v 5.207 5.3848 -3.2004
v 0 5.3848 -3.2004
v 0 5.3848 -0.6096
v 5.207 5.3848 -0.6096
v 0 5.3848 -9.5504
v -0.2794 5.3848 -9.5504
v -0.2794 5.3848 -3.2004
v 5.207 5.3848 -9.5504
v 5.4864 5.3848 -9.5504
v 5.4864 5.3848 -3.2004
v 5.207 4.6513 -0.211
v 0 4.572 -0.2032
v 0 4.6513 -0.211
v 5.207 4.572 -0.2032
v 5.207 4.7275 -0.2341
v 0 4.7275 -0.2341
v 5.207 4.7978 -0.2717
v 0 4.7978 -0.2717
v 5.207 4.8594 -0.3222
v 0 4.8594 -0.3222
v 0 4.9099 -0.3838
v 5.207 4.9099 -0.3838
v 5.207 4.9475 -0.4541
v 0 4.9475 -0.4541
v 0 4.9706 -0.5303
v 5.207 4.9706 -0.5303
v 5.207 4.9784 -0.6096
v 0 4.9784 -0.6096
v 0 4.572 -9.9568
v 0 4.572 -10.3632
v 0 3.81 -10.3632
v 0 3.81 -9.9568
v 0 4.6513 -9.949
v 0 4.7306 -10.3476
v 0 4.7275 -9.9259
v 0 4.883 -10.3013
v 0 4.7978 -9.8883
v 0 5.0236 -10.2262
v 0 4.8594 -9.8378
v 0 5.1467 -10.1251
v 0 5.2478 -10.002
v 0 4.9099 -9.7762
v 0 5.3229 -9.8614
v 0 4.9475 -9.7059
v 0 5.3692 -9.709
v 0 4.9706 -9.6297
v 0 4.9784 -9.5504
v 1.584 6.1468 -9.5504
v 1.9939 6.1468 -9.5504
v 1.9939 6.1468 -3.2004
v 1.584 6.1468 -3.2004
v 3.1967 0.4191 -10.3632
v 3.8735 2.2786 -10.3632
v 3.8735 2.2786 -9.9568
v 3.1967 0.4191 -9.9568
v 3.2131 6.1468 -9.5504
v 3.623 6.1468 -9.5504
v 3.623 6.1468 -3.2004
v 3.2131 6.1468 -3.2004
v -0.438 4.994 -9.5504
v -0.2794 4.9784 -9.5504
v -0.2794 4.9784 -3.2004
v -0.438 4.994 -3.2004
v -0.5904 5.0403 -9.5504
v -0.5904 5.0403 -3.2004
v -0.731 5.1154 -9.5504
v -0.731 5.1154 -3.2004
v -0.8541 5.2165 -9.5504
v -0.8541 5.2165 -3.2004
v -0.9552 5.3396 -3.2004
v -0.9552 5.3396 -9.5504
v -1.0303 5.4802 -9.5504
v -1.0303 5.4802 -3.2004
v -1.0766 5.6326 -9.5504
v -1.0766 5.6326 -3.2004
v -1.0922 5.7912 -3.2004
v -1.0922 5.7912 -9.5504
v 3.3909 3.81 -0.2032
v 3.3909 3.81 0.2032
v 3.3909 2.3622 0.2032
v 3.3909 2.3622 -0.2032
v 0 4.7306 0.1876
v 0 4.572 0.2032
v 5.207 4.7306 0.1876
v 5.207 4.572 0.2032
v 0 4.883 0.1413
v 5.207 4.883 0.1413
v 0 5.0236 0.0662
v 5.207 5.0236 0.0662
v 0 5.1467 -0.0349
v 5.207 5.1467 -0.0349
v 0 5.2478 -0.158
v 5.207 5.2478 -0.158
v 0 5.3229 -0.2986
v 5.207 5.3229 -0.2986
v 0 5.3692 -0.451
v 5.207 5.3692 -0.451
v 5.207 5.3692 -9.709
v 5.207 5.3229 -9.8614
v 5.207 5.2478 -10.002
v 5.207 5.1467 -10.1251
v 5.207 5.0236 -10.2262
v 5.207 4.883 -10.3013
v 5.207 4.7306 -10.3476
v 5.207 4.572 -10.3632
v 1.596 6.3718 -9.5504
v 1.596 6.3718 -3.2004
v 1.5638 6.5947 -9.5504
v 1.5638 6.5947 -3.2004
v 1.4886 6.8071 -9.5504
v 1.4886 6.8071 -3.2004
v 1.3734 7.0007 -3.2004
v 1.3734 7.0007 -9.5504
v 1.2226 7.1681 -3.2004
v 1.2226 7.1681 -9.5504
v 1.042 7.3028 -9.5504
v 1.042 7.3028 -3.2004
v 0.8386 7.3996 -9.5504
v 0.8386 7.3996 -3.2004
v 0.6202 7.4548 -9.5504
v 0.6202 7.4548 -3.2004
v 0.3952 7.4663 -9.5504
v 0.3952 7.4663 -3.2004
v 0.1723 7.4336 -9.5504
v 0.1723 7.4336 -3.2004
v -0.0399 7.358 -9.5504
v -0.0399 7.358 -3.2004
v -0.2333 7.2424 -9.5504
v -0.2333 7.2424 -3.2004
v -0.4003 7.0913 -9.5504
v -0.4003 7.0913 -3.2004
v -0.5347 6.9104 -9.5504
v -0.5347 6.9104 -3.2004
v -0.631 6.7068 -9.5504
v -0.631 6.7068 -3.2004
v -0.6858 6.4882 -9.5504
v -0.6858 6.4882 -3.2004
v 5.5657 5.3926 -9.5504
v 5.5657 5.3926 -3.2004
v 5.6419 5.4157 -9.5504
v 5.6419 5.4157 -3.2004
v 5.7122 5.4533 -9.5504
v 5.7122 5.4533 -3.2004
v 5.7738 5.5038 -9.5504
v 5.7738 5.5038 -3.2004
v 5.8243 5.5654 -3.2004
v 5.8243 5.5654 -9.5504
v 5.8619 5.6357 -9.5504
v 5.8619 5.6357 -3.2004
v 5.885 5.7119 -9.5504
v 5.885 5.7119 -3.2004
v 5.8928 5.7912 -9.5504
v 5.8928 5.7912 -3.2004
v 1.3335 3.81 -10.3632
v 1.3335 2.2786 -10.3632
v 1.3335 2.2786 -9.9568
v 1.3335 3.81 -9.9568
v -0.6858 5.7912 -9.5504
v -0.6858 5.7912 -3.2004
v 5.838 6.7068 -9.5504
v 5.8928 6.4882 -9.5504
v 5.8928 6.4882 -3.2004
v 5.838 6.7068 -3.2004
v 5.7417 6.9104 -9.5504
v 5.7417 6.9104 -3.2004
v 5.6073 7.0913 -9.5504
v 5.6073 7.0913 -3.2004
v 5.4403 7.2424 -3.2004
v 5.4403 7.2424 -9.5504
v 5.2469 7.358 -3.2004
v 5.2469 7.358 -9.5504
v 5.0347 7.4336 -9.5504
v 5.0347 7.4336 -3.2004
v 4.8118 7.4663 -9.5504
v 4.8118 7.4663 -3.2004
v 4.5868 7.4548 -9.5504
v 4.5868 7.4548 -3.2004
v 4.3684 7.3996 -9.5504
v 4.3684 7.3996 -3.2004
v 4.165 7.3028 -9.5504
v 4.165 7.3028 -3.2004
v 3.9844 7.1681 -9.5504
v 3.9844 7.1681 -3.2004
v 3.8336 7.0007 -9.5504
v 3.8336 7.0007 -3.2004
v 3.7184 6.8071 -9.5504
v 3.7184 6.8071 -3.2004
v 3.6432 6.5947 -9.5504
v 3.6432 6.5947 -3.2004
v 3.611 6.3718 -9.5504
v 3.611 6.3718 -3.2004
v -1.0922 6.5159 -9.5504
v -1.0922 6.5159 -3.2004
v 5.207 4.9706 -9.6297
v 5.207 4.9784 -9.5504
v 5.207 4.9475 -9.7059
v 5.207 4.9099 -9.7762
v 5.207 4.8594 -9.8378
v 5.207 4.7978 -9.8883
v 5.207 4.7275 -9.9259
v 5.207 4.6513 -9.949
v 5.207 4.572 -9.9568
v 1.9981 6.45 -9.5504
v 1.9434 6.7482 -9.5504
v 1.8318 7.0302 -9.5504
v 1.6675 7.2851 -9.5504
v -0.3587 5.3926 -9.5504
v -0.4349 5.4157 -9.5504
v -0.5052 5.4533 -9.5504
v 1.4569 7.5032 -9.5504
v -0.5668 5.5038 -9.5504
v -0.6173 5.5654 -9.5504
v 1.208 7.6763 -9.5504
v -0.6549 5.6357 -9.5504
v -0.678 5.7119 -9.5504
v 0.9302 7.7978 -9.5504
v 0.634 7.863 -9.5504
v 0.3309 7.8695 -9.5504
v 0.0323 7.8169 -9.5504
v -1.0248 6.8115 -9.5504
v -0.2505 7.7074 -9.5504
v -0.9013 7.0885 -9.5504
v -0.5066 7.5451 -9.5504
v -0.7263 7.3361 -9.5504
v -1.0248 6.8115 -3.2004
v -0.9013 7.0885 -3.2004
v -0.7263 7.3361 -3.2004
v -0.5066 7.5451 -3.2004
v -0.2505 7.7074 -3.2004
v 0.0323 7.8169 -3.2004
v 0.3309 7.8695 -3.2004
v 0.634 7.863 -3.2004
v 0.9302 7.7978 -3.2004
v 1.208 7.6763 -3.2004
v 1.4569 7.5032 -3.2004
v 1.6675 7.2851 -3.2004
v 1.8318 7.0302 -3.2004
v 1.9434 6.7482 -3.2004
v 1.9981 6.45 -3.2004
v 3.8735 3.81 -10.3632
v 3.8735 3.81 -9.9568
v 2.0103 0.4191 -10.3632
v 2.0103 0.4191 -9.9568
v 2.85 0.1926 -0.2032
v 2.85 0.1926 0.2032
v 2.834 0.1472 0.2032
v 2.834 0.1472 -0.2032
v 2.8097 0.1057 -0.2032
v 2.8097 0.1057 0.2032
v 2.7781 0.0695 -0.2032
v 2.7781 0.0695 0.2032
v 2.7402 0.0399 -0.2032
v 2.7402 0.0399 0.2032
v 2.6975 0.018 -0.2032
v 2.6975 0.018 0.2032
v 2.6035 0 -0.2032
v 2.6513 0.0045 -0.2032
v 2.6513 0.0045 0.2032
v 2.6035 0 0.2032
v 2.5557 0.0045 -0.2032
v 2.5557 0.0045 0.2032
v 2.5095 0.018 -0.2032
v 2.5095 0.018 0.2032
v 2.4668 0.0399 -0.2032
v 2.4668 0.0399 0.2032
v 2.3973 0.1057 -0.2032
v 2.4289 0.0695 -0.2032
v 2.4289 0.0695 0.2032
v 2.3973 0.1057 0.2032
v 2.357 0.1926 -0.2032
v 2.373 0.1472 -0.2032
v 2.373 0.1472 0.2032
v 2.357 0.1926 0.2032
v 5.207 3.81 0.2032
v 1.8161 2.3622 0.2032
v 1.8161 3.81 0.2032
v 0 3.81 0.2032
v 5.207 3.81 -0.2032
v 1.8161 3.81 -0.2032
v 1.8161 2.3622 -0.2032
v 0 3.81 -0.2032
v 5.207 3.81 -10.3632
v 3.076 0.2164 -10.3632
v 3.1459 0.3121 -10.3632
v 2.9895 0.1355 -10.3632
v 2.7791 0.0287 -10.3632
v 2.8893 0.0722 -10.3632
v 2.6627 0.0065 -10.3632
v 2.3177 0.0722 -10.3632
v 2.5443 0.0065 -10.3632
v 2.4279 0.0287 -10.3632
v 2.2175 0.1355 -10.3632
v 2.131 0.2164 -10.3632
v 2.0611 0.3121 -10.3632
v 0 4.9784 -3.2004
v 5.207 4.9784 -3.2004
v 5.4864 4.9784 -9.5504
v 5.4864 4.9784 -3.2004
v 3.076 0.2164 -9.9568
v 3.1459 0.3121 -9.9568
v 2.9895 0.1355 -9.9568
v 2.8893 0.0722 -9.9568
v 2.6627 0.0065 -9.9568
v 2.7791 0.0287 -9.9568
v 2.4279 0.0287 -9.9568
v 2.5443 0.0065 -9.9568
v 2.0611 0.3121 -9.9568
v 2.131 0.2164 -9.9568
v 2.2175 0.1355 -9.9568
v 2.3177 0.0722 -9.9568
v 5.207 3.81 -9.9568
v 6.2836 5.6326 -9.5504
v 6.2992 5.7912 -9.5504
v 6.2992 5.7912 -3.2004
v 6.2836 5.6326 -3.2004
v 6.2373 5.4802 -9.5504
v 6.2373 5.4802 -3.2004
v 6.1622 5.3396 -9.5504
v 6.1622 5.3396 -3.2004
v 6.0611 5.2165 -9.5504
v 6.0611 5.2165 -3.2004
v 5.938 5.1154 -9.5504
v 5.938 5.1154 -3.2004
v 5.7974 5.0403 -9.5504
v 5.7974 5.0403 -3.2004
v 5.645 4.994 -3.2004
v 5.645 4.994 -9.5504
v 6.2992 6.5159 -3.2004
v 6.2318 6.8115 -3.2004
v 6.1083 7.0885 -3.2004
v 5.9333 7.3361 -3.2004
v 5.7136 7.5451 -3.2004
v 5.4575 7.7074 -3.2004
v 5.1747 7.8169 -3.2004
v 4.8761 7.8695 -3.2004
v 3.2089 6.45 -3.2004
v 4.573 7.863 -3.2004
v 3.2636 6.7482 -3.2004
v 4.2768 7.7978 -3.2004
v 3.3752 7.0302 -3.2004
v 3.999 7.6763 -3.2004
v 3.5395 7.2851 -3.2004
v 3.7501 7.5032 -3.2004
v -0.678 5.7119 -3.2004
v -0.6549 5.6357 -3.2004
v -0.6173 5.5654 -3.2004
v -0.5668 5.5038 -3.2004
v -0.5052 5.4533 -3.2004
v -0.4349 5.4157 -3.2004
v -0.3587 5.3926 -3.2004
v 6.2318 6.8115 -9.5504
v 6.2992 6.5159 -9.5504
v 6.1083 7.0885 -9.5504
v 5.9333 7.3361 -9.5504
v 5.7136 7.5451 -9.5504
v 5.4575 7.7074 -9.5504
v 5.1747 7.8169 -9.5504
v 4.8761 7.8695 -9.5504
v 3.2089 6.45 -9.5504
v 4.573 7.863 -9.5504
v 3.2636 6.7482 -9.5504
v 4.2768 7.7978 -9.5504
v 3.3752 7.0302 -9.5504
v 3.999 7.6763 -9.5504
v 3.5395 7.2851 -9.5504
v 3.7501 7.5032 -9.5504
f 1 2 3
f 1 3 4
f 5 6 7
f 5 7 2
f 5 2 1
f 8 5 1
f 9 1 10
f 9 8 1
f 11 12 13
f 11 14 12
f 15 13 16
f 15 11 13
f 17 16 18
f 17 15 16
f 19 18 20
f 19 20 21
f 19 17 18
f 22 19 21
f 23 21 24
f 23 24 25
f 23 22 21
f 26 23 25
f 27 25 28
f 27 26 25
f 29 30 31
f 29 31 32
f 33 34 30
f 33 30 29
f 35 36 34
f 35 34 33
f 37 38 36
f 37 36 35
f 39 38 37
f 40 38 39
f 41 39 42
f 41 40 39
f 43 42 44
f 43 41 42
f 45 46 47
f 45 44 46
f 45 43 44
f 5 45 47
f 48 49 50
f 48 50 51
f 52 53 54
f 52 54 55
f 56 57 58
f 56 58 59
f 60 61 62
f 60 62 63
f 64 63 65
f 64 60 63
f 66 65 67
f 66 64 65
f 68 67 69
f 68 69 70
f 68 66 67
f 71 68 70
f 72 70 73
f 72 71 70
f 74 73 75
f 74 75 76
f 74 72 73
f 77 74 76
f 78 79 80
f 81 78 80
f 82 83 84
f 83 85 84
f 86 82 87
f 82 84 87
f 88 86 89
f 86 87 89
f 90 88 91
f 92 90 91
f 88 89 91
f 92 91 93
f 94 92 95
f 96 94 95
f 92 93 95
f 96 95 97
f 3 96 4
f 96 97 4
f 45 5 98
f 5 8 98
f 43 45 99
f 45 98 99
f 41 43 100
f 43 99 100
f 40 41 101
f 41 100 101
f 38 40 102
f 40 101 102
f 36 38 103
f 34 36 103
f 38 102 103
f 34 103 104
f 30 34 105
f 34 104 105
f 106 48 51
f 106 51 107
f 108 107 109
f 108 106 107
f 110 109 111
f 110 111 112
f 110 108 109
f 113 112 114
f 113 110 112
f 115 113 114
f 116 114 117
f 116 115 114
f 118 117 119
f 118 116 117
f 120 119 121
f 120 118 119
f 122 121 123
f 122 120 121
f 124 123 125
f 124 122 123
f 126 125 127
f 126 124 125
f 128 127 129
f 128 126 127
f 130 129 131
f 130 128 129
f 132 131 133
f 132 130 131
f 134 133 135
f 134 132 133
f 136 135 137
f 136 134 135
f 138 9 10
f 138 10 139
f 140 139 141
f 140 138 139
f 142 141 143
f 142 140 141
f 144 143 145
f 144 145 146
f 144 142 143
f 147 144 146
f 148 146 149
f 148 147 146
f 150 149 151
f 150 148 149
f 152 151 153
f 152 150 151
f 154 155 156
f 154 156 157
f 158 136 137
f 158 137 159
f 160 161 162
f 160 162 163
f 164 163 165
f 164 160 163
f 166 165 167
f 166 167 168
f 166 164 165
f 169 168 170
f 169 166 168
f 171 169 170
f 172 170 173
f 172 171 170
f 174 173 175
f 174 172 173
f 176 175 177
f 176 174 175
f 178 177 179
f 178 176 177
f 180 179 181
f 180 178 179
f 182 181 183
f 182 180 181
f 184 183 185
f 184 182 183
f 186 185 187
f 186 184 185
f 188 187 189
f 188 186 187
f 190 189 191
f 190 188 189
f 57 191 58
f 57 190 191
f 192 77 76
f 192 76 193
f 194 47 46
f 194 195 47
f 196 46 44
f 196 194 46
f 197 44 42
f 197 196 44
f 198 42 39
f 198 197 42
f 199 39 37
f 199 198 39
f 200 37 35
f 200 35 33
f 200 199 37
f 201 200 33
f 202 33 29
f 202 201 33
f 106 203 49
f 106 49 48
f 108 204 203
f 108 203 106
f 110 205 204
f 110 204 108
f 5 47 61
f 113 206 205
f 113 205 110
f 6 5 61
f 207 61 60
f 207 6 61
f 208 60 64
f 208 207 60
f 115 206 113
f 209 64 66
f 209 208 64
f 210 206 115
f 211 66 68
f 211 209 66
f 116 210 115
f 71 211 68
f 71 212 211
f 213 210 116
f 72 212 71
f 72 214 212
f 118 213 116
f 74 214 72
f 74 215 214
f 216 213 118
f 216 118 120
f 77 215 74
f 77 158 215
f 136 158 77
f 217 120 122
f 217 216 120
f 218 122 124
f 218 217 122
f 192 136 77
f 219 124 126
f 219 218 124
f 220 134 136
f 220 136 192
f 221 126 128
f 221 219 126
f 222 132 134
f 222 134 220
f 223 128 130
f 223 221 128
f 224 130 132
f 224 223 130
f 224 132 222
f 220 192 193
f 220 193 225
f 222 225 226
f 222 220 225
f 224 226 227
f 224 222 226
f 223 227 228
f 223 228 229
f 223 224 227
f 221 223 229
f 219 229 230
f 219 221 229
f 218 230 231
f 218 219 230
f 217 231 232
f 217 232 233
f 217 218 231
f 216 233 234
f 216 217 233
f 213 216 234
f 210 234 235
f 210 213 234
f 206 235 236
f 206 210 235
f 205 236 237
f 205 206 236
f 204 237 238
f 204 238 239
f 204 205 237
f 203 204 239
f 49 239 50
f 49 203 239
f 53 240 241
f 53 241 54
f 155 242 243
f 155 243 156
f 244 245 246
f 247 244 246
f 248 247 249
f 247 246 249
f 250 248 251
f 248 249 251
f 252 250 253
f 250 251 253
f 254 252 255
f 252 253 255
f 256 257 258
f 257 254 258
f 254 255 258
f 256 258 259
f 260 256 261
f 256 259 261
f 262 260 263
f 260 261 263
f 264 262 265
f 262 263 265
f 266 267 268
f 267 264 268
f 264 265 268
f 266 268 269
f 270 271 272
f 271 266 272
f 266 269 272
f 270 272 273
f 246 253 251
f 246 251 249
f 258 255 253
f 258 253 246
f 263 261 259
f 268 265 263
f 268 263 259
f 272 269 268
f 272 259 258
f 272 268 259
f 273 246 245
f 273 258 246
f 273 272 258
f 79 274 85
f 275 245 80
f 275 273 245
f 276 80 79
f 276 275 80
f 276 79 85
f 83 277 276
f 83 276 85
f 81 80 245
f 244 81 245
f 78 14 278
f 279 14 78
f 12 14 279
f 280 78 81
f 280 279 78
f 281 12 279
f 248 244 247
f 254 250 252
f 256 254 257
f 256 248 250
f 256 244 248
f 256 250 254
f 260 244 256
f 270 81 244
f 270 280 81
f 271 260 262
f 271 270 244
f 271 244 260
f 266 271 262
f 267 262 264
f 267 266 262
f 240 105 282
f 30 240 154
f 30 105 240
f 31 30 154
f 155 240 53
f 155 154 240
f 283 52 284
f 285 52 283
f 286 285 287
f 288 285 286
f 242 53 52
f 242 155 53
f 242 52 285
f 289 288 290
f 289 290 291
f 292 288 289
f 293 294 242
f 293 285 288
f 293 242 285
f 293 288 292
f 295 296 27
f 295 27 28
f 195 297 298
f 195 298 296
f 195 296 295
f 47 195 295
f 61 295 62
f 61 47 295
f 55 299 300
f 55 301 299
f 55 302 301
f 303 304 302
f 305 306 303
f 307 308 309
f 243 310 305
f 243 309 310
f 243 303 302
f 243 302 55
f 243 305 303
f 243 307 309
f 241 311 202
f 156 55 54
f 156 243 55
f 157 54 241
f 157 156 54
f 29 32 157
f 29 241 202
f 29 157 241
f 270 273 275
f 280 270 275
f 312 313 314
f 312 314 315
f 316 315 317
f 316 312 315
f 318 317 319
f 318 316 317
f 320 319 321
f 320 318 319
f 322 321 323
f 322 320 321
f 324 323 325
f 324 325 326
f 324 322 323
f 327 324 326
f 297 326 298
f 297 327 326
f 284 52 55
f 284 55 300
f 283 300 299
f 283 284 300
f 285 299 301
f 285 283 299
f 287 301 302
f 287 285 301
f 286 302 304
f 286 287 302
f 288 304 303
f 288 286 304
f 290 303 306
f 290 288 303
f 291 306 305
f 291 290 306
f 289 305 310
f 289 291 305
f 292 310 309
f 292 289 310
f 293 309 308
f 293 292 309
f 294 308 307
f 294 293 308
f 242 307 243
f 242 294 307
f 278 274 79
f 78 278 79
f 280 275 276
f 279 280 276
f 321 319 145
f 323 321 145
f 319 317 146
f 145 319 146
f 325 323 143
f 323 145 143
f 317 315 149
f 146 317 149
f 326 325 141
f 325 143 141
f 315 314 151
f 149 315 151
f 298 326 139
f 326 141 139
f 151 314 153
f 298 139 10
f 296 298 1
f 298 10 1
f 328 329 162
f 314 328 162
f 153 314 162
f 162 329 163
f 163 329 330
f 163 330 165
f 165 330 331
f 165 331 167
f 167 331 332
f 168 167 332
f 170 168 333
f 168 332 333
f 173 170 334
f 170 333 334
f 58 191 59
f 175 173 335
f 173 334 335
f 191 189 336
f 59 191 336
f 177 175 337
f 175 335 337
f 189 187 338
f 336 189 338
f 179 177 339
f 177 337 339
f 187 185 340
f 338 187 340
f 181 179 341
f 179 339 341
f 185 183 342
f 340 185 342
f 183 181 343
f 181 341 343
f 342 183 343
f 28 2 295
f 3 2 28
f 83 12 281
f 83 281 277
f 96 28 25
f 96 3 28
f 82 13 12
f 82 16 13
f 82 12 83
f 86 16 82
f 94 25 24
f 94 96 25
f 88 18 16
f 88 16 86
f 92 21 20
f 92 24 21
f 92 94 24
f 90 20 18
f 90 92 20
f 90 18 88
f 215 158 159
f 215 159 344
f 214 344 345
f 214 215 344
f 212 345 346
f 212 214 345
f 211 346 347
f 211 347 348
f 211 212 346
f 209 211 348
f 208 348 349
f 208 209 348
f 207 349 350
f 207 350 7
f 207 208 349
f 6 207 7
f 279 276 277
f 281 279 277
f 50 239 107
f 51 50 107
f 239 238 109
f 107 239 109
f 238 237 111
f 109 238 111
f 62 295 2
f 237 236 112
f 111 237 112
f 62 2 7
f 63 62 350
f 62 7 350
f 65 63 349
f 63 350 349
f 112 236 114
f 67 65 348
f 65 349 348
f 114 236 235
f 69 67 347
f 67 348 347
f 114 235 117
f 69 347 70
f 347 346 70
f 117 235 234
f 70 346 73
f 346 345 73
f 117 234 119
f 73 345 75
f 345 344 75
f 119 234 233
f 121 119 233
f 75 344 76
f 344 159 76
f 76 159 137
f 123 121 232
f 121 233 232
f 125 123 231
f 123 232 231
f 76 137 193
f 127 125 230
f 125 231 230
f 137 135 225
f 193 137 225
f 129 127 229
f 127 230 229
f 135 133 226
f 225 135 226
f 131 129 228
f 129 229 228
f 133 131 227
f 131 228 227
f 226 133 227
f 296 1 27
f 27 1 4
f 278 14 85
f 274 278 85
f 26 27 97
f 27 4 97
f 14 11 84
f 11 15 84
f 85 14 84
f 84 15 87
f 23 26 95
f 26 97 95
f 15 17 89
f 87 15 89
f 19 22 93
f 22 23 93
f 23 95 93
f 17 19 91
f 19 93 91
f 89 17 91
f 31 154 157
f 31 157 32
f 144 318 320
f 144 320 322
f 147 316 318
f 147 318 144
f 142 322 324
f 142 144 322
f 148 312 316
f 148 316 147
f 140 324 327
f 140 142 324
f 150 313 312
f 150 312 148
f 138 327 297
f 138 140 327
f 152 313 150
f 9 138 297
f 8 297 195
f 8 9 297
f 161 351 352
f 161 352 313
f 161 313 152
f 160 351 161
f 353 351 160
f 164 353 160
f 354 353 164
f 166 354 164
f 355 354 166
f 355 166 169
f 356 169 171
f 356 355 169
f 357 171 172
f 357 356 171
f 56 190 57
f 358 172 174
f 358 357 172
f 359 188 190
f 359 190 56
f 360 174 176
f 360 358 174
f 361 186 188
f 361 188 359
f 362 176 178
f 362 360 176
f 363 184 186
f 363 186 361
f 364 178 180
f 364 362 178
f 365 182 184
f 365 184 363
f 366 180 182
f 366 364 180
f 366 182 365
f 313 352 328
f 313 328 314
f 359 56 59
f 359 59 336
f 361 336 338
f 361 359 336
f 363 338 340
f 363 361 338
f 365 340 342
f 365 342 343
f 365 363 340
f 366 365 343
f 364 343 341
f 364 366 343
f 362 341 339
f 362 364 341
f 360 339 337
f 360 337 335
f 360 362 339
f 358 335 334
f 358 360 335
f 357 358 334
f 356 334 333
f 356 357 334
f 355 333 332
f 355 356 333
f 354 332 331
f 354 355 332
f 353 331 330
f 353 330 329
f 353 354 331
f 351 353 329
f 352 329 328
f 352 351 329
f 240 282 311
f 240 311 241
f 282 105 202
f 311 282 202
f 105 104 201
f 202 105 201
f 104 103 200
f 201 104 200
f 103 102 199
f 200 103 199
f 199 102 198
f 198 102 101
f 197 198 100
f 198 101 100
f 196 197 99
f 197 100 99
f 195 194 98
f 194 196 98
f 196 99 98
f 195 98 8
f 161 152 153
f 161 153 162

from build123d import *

# Parameters (mm, degrees)
BOSS_EXTRUDE1_DEPTH = 5.207
CUT_EXTRUDE1_DEPTH  = 5.207
CUT_EXTRUDE2_DEPTH  = 5.207
FILLET1_R           = 0.4064
FILLET2_R           = 0.8128
BOSS_EXTRUDE2_DEPTH = 6.35


with BuildPart() as part:
    # Sketch1 → Boss-Extrude1 (new body)
    with BuildSketch(Plane(origin=(0, 0, 0), x_dir=(0, 0, -1), z_dir=(1, 0, 0))):
        Polygon((-0.2032, 0), (-0.2032, 5.3848), (10.3632, 5.3848), (10.3632, 0), (9.9568, 0), (9.9568, 4.9784), (0.2032, 4.9784), (0.2032, 0), align=None)
    extrude(amount=BOSS_EXTRUDE1_DEPTH)

    # Sketch2 → Cut-Extrude1 (cut)
    with BuildSketch(Plane(origin=(0, 0, -10.3632), x_dir=(-1, 0, 0), z_dir=(0, 0, -1))):
        with BuildLine():
            Line((-1.3335, 2.278639677), (-1.3335, 3.81))
            Line((-1.3335, 3.81), (0, 3.81))
            Line((0, 3.81), (0, -0.271412918))
            Line((0, -0.271412918), (-5.207, -0.271412918))
            Line((-5.207, -0.271412918), (-5.207, 3.81))
            Line((-5.207, 3.81), (-3.8735, 3.81))
            Line((-3.8735, 3.81), (-3.8735, 2.278639677))
            Line((-3.8735, 2.278639677), (-3.196682612, 0.419099186))
            ThreePointArc((-3.196682612, 0.419099186), (-2.6035, 0.003748249), (-2.010317388, 0.419099186))
            Line((-2.010317388, 0.419099186), (-1.3335, 2.278639677))
        make_face()
    extrude(amount=-CUT_EXTRUDE1_DEPTH, mode=Mode.SUBTRACT)

    # Sketch4 → Cut-Extrude2 (cut)
    with BuildSketch(Plane.XY.offset(0.2032)):
        with BuildLine():
            Line((0, 3.81), (0, -0.293581738))
            Line((0, -0.293581738), (5.207, -0.293581738))
            Line((5.207, -0.293581738), (5.207, 3.81))
            Line((5.207, 3.81), (3.3909, 3.81))
            Line((3.3909, 3.81), (3.3909, 2.362163271))
            Line((3.3909, 2.362163271), (2.849955114, 0.192551839))
            ThreePointArc((2.849955114, 0.192551839), (2.6035, 0), (2.357044886, 0.192551839))
            Line((2.357044886, 0.192551839), (1.8161, 2.362163271))
            Line((1.8161, 2.362163271), (1.8161, 3.81))
            Line((1.8161, 3.81), (0, 3.81))
        make_face()
    extrude(amount=-CUT_EXTRUDE2_DEPTH, mode=Mode.SUBTRACT)

    # Fillet1
    fillet1_edges = [part.edges().sort_by_distance(p)[0] for p in [
        (2.6035, 4.9784, -9.9568),
        (2.6035, 4.9784, -0.2032),
    ]]
    fillet(fillet1_edges, radius=FILLET1_R)

    # Fillet2
    fillet2_edges = [part.edges().sort_by_distance(p)[0] for p in [
        (2.6035, 5.3848, 0.2032),
        (2.6035, 5.3848, -10.3632),
    ]]
    fillet(fillet2_edges, radius=FILLET2_R)

    # Sketch5 → Boss-Extrude2 (add)
    with BuildSketch(Plane(origin=(0, 0, -9.5504), x_dir=(-1, 0, 0), z_dir=(0, 0, -1))):
        with BuildLine():
            Line((1.0922, 5.7912), (1.0922, 6.515909549))
            ThreePointArc((1.0922, 6.515909549), (-0.634040977, 7.863002154), (-1.9939, 6.1468))
            Line((-1.9939, 6.1468), (-1.584040966, 6.1468))
            ThreePointArc((-1.584040966, 6.1468), (-0.620193607, 7.454832725), (0.6858, 6.488224201))
            Line((0.6858, 6.488224201), (0.6858, 5.7912))
            ThreePointArc((0.6858, 5.7912), (0.566768196, 5.503831804), (0.2794, 5.3848))
            Line((0.2794, 5.3848), (0, 5.3848))
            Line((0, 5.3848), (0, 4.9784))
            Line((0, 4.9784), (0.2794, 4.9784))
            ThreePointArc((0.2794, 4.9784), (0.854136392, 5.216463608), (1.0922, 5.7912))
        make_face()
        with BuildLine():
            Line((-5.207, 4.9784), (-5.207, 5.3848))
            Line((-5.207, 5.3848), (-5.4864, 5.3848))
            ThreePointArc((-5.4864, 5.3848), (-5.773768196, 5.503831804), (-5.8928, 5.7912))
            Line((-5.8928, 5.7912), (-5.8928, 6.488224201))
            ThreePointArc((-5.8928, 6.488224201), (-4.586806393, 7.454832725), (-3.622959034, 6.1468))
            Line((-3.622959034, 6.1468), (-3.2131, 6.1468))
            ThreePointArc((-3.2131, 6.1468), (-4.572959023, 7.863002154), (-6.2992, 6.515909549))
            Line((-6.2992, 6.515909549), (-6.2992, 5.7912))
            ThreePointArc((-6.2992, 5.7912), (-6.061136392, 5.216463608), (-5.4864, 4.9784))
            Line((-5.4864, 4.9784), (-5.207, 4.9784))
        make_face()
    extrude(amount=-BOSS_EXTRUDE2_DEPTH)


solid = part.part
